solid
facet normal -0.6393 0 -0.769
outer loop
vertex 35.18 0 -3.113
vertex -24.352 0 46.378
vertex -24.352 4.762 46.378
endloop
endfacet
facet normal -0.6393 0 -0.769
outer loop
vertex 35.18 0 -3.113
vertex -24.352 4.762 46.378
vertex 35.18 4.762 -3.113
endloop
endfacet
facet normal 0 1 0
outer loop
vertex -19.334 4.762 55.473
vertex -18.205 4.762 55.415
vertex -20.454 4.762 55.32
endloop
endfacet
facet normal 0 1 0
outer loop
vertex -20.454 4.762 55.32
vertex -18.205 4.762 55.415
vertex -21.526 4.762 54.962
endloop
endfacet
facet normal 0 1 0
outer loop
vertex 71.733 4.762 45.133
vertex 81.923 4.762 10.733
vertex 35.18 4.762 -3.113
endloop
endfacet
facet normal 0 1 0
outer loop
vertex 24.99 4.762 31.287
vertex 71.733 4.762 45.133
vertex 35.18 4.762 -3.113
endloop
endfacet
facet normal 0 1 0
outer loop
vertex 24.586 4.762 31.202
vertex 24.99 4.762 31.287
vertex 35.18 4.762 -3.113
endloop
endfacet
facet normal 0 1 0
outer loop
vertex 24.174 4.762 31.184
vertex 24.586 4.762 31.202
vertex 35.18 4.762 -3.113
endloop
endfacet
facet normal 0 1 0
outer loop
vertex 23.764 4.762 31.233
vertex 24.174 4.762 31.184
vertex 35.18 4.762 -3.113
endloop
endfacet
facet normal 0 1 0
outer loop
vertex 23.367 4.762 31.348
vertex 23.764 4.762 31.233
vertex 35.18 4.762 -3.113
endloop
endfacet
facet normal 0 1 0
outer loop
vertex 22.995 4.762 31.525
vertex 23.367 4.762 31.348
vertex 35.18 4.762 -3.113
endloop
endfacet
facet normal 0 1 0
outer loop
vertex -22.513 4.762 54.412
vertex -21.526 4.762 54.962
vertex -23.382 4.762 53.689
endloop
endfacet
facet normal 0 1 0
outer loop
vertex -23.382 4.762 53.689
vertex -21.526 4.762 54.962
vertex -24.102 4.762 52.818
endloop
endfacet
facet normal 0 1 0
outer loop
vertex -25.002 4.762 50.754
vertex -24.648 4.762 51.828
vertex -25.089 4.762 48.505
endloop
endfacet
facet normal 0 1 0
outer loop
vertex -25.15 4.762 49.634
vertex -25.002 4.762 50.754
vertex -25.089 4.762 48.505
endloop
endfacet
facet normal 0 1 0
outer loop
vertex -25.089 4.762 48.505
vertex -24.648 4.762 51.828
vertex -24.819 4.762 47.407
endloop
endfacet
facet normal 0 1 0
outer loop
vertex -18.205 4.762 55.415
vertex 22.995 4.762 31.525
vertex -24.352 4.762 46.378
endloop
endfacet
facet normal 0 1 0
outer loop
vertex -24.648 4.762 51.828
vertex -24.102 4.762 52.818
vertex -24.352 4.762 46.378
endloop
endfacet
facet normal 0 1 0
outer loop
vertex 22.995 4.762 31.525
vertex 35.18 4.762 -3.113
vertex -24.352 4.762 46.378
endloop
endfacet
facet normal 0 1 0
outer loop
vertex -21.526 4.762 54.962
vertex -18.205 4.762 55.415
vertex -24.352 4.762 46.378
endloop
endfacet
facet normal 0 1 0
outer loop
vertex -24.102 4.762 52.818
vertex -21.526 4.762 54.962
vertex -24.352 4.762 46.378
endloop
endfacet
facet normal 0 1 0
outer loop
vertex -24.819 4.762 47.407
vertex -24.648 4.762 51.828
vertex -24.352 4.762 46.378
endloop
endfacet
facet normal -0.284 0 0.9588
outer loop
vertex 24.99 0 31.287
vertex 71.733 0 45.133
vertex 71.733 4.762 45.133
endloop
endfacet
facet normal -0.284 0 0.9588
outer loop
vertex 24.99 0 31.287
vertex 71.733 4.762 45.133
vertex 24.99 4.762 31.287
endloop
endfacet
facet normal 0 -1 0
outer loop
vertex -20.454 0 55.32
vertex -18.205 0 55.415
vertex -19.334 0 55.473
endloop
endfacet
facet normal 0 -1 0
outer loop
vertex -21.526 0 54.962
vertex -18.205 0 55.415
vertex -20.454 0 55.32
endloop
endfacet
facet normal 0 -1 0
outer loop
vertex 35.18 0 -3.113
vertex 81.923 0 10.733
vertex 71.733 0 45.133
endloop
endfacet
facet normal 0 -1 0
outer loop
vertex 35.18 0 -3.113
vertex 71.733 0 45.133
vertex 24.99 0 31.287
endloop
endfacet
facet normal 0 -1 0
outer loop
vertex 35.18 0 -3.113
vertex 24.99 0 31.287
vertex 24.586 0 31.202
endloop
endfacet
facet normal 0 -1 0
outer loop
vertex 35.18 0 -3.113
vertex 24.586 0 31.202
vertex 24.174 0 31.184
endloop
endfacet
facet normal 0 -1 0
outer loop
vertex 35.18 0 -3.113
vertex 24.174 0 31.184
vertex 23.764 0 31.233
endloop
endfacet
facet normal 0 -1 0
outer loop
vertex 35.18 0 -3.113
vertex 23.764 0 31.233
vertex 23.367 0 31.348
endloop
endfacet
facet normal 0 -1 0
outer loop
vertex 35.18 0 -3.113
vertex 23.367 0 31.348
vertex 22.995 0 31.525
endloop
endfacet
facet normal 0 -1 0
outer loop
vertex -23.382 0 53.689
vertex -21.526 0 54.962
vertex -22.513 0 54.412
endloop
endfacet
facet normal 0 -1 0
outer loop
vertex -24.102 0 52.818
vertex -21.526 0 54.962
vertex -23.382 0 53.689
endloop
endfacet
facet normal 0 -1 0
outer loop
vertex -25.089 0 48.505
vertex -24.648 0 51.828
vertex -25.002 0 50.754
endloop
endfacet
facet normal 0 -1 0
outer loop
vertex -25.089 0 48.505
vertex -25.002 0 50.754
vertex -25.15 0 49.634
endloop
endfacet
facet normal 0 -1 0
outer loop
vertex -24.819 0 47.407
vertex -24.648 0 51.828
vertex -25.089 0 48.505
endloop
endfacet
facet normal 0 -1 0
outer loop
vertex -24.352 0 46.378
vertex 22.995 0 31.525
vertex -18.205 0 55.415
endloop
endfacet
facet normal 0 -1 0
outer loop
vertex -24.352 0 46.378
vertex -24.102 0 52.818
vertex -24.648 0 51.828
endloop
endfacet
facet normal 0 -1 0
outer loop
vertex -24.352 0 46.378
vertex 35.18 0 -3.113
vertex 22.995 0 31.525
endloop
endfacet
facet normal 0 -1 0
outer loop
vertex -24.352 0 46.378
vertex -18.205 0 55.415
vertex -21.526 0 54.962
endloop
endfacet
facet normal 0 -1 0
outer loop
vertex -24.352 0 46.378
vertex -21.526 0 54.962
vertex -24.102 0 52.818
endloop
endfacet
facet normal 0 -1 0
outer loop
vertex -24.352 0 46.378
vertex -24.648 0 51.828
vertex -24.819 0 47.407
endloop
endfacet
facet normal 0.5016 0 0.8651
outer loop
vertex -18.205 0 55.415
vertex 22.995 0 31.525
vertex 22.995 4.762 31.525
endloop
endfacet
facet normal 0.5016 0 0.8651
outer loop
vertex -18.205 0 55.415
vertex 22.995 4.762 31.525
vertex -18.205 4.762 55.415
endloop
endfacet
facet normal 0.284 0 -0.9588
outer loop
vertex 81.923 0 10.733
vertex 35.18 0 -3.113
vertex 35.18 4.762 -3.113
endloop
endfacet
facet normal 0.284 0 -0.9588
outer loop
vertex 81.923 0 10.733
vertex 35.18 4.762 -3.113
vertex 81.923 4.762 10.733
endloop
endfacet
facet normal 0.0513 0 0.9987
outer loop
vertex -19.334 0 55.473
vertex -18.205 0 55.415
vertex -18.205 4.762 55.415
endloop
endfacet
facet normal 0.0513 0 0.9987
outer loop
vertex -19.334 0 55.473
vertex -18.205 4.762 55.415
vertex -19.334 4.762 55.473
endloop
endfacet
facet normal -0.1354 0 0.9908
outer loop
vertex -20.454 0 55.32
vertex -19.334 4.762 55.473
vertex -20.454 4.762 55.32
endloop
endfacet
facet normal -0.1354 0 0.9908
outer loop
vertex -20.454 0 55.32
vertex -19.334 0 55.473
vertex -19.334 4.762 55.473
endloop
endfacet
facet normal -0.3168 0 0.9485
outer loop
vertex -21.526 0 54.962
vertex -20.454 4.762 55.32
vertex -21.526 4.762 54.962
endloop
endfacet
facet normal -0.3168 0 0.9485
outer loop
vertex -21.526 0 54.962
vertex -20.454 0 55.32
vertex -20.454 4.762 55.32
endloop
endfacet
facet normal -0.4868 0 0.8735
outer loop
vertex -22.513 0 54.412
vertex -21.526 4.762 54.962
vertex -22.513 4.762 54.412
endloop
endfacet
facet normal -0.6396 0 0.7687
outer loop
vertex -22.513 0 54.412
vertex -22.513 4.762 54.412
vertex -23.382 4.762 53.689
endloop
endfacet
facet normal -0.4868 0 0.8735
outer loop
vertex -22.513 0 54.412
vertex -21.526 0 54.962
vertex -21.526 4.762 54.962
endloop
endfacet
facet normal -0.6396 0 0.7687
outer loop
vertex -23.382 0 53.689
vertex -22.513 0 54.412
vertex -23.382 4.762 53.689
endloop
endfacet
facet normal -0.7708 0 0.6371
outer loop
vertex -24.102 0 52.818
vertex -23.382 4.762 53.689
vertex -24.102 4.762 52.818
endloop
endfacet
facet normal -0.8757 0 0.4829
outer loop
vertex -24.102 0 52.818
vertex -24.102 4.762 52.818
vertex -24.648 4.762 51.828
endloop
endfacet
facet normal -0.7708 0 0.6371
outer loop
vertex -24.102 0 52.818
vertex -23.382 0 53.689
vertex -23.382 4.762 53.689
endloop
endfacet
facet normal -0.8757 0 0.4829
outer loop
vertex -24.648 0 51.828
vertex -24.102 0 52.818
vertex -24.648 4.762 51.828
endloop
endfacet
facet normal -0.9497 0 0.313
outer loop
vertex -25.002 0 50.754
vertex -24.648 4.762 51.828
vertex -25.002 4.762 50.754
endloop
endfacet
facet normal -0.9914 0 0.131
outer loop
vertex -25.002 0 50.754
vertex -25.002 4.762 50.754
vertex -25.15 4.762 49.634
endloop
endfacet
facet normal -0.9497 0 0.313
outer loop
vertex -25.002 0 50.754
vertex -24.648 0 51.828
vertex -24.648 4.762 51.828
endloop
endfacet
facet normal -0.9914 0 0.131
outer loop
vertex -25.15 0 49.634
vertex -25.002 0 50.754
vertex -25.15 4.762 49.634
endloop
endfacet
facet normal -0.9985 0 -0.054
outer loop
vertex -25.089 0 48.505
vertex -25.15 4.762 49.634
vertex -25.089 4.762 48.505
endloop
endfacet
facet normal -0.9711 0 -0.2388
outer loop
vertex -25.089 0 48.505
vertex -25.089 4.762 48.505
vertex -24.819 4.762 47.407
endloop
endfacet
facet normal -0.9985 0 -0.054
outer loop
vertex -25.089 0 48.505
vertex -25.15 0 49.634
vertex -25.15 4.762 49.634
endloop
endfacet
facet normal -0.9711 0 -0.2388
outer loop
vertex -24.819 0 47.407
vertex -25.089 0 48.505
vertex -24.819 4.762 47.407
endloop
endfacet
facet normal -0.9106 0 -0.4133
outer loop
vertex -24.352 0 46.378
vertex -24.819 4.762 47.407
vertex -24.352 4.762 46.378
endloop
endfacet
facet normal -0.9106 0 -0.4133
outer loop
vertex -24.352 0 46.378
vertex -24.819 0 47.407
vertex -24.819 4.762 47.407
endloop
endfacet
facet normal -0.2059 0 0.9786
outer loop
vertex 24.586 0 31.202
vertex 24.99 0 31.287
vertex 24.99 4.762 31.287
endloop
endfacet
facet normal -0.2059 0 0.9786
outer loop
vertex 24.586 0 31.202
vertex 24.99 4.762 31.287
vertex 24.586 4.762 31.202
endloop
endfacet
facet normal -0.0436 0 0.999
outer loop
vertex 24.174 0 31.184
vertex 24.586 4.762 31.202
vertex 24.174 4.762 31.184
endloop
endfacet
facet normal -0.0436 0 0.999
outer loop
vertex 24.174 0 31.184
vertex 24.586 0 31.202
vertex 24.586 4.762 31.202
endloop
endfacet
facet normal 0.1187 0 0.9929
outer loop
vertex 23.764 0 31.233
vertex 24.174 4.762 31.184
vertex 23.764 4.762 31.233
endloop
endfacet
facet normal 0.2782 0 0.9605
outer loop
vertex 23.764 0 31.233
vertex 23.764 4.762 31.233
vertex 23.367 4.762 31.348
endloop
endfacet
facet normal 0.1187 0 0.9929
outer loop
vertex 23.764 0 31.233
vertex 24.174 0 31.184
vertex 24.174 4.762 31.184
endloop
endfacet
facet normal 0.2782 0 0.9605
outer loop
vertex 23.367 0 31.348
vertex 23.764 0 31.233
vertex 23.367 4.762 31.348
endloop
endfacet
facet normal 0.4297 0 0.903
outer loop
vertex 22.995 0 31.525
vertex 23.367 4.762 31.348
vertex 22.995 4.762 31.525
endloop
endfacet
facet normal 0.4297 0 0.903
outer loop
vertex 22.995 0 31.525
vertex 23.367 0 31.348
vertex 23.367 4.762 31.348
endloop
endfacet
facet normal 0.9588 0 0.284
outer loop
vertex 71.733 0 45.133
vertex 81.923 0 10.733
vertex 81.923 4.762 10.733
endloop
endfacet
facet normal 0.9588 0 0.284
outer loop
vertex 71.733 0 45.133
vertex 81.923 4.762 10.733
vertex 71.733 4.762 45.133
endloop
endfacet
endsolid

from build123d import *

# Parameters (mm, degrees)
BOSS_EXTRUDE1_DEPTH = 4.7625


with BuildPart() as part:
    # Sketch1 → Boss-Extrude1 (new body)
    with BuildSketch(Plane(origin=(0, 0, 0), x_dir=(1, 0, 0), z_dir=(0, 1, 0))):
        with BuildLine():
            Line((22.994624733, -31.524992416), (-18.204730368, -55.415445829))
            ThreePointArc((-18.204730368, -55.415445829), (-24.10202239, -52.817624121), (-24.351569793, -46.378334027))
            Line((-24.351569793, -46.378334027), (35.179941753, 3.113165809))
            Line((35.179941753, 3.113165809), (81.92289285, -10.7327271))
            Line((81.92289285, -10.7327271), (71.73313232, -45.132782137))
            Line((71.73313232, -45.132782137), (24.990181224, -31.286889228))
            ThreePointArc((24.990181224, -31.286889228), (23.967852385, -31.200180886), (22.994624733, -31.524992416))
        make_face()
    extrude(amount=BOSS_EXTRUDE1_DEPTH)


solid = part.part
